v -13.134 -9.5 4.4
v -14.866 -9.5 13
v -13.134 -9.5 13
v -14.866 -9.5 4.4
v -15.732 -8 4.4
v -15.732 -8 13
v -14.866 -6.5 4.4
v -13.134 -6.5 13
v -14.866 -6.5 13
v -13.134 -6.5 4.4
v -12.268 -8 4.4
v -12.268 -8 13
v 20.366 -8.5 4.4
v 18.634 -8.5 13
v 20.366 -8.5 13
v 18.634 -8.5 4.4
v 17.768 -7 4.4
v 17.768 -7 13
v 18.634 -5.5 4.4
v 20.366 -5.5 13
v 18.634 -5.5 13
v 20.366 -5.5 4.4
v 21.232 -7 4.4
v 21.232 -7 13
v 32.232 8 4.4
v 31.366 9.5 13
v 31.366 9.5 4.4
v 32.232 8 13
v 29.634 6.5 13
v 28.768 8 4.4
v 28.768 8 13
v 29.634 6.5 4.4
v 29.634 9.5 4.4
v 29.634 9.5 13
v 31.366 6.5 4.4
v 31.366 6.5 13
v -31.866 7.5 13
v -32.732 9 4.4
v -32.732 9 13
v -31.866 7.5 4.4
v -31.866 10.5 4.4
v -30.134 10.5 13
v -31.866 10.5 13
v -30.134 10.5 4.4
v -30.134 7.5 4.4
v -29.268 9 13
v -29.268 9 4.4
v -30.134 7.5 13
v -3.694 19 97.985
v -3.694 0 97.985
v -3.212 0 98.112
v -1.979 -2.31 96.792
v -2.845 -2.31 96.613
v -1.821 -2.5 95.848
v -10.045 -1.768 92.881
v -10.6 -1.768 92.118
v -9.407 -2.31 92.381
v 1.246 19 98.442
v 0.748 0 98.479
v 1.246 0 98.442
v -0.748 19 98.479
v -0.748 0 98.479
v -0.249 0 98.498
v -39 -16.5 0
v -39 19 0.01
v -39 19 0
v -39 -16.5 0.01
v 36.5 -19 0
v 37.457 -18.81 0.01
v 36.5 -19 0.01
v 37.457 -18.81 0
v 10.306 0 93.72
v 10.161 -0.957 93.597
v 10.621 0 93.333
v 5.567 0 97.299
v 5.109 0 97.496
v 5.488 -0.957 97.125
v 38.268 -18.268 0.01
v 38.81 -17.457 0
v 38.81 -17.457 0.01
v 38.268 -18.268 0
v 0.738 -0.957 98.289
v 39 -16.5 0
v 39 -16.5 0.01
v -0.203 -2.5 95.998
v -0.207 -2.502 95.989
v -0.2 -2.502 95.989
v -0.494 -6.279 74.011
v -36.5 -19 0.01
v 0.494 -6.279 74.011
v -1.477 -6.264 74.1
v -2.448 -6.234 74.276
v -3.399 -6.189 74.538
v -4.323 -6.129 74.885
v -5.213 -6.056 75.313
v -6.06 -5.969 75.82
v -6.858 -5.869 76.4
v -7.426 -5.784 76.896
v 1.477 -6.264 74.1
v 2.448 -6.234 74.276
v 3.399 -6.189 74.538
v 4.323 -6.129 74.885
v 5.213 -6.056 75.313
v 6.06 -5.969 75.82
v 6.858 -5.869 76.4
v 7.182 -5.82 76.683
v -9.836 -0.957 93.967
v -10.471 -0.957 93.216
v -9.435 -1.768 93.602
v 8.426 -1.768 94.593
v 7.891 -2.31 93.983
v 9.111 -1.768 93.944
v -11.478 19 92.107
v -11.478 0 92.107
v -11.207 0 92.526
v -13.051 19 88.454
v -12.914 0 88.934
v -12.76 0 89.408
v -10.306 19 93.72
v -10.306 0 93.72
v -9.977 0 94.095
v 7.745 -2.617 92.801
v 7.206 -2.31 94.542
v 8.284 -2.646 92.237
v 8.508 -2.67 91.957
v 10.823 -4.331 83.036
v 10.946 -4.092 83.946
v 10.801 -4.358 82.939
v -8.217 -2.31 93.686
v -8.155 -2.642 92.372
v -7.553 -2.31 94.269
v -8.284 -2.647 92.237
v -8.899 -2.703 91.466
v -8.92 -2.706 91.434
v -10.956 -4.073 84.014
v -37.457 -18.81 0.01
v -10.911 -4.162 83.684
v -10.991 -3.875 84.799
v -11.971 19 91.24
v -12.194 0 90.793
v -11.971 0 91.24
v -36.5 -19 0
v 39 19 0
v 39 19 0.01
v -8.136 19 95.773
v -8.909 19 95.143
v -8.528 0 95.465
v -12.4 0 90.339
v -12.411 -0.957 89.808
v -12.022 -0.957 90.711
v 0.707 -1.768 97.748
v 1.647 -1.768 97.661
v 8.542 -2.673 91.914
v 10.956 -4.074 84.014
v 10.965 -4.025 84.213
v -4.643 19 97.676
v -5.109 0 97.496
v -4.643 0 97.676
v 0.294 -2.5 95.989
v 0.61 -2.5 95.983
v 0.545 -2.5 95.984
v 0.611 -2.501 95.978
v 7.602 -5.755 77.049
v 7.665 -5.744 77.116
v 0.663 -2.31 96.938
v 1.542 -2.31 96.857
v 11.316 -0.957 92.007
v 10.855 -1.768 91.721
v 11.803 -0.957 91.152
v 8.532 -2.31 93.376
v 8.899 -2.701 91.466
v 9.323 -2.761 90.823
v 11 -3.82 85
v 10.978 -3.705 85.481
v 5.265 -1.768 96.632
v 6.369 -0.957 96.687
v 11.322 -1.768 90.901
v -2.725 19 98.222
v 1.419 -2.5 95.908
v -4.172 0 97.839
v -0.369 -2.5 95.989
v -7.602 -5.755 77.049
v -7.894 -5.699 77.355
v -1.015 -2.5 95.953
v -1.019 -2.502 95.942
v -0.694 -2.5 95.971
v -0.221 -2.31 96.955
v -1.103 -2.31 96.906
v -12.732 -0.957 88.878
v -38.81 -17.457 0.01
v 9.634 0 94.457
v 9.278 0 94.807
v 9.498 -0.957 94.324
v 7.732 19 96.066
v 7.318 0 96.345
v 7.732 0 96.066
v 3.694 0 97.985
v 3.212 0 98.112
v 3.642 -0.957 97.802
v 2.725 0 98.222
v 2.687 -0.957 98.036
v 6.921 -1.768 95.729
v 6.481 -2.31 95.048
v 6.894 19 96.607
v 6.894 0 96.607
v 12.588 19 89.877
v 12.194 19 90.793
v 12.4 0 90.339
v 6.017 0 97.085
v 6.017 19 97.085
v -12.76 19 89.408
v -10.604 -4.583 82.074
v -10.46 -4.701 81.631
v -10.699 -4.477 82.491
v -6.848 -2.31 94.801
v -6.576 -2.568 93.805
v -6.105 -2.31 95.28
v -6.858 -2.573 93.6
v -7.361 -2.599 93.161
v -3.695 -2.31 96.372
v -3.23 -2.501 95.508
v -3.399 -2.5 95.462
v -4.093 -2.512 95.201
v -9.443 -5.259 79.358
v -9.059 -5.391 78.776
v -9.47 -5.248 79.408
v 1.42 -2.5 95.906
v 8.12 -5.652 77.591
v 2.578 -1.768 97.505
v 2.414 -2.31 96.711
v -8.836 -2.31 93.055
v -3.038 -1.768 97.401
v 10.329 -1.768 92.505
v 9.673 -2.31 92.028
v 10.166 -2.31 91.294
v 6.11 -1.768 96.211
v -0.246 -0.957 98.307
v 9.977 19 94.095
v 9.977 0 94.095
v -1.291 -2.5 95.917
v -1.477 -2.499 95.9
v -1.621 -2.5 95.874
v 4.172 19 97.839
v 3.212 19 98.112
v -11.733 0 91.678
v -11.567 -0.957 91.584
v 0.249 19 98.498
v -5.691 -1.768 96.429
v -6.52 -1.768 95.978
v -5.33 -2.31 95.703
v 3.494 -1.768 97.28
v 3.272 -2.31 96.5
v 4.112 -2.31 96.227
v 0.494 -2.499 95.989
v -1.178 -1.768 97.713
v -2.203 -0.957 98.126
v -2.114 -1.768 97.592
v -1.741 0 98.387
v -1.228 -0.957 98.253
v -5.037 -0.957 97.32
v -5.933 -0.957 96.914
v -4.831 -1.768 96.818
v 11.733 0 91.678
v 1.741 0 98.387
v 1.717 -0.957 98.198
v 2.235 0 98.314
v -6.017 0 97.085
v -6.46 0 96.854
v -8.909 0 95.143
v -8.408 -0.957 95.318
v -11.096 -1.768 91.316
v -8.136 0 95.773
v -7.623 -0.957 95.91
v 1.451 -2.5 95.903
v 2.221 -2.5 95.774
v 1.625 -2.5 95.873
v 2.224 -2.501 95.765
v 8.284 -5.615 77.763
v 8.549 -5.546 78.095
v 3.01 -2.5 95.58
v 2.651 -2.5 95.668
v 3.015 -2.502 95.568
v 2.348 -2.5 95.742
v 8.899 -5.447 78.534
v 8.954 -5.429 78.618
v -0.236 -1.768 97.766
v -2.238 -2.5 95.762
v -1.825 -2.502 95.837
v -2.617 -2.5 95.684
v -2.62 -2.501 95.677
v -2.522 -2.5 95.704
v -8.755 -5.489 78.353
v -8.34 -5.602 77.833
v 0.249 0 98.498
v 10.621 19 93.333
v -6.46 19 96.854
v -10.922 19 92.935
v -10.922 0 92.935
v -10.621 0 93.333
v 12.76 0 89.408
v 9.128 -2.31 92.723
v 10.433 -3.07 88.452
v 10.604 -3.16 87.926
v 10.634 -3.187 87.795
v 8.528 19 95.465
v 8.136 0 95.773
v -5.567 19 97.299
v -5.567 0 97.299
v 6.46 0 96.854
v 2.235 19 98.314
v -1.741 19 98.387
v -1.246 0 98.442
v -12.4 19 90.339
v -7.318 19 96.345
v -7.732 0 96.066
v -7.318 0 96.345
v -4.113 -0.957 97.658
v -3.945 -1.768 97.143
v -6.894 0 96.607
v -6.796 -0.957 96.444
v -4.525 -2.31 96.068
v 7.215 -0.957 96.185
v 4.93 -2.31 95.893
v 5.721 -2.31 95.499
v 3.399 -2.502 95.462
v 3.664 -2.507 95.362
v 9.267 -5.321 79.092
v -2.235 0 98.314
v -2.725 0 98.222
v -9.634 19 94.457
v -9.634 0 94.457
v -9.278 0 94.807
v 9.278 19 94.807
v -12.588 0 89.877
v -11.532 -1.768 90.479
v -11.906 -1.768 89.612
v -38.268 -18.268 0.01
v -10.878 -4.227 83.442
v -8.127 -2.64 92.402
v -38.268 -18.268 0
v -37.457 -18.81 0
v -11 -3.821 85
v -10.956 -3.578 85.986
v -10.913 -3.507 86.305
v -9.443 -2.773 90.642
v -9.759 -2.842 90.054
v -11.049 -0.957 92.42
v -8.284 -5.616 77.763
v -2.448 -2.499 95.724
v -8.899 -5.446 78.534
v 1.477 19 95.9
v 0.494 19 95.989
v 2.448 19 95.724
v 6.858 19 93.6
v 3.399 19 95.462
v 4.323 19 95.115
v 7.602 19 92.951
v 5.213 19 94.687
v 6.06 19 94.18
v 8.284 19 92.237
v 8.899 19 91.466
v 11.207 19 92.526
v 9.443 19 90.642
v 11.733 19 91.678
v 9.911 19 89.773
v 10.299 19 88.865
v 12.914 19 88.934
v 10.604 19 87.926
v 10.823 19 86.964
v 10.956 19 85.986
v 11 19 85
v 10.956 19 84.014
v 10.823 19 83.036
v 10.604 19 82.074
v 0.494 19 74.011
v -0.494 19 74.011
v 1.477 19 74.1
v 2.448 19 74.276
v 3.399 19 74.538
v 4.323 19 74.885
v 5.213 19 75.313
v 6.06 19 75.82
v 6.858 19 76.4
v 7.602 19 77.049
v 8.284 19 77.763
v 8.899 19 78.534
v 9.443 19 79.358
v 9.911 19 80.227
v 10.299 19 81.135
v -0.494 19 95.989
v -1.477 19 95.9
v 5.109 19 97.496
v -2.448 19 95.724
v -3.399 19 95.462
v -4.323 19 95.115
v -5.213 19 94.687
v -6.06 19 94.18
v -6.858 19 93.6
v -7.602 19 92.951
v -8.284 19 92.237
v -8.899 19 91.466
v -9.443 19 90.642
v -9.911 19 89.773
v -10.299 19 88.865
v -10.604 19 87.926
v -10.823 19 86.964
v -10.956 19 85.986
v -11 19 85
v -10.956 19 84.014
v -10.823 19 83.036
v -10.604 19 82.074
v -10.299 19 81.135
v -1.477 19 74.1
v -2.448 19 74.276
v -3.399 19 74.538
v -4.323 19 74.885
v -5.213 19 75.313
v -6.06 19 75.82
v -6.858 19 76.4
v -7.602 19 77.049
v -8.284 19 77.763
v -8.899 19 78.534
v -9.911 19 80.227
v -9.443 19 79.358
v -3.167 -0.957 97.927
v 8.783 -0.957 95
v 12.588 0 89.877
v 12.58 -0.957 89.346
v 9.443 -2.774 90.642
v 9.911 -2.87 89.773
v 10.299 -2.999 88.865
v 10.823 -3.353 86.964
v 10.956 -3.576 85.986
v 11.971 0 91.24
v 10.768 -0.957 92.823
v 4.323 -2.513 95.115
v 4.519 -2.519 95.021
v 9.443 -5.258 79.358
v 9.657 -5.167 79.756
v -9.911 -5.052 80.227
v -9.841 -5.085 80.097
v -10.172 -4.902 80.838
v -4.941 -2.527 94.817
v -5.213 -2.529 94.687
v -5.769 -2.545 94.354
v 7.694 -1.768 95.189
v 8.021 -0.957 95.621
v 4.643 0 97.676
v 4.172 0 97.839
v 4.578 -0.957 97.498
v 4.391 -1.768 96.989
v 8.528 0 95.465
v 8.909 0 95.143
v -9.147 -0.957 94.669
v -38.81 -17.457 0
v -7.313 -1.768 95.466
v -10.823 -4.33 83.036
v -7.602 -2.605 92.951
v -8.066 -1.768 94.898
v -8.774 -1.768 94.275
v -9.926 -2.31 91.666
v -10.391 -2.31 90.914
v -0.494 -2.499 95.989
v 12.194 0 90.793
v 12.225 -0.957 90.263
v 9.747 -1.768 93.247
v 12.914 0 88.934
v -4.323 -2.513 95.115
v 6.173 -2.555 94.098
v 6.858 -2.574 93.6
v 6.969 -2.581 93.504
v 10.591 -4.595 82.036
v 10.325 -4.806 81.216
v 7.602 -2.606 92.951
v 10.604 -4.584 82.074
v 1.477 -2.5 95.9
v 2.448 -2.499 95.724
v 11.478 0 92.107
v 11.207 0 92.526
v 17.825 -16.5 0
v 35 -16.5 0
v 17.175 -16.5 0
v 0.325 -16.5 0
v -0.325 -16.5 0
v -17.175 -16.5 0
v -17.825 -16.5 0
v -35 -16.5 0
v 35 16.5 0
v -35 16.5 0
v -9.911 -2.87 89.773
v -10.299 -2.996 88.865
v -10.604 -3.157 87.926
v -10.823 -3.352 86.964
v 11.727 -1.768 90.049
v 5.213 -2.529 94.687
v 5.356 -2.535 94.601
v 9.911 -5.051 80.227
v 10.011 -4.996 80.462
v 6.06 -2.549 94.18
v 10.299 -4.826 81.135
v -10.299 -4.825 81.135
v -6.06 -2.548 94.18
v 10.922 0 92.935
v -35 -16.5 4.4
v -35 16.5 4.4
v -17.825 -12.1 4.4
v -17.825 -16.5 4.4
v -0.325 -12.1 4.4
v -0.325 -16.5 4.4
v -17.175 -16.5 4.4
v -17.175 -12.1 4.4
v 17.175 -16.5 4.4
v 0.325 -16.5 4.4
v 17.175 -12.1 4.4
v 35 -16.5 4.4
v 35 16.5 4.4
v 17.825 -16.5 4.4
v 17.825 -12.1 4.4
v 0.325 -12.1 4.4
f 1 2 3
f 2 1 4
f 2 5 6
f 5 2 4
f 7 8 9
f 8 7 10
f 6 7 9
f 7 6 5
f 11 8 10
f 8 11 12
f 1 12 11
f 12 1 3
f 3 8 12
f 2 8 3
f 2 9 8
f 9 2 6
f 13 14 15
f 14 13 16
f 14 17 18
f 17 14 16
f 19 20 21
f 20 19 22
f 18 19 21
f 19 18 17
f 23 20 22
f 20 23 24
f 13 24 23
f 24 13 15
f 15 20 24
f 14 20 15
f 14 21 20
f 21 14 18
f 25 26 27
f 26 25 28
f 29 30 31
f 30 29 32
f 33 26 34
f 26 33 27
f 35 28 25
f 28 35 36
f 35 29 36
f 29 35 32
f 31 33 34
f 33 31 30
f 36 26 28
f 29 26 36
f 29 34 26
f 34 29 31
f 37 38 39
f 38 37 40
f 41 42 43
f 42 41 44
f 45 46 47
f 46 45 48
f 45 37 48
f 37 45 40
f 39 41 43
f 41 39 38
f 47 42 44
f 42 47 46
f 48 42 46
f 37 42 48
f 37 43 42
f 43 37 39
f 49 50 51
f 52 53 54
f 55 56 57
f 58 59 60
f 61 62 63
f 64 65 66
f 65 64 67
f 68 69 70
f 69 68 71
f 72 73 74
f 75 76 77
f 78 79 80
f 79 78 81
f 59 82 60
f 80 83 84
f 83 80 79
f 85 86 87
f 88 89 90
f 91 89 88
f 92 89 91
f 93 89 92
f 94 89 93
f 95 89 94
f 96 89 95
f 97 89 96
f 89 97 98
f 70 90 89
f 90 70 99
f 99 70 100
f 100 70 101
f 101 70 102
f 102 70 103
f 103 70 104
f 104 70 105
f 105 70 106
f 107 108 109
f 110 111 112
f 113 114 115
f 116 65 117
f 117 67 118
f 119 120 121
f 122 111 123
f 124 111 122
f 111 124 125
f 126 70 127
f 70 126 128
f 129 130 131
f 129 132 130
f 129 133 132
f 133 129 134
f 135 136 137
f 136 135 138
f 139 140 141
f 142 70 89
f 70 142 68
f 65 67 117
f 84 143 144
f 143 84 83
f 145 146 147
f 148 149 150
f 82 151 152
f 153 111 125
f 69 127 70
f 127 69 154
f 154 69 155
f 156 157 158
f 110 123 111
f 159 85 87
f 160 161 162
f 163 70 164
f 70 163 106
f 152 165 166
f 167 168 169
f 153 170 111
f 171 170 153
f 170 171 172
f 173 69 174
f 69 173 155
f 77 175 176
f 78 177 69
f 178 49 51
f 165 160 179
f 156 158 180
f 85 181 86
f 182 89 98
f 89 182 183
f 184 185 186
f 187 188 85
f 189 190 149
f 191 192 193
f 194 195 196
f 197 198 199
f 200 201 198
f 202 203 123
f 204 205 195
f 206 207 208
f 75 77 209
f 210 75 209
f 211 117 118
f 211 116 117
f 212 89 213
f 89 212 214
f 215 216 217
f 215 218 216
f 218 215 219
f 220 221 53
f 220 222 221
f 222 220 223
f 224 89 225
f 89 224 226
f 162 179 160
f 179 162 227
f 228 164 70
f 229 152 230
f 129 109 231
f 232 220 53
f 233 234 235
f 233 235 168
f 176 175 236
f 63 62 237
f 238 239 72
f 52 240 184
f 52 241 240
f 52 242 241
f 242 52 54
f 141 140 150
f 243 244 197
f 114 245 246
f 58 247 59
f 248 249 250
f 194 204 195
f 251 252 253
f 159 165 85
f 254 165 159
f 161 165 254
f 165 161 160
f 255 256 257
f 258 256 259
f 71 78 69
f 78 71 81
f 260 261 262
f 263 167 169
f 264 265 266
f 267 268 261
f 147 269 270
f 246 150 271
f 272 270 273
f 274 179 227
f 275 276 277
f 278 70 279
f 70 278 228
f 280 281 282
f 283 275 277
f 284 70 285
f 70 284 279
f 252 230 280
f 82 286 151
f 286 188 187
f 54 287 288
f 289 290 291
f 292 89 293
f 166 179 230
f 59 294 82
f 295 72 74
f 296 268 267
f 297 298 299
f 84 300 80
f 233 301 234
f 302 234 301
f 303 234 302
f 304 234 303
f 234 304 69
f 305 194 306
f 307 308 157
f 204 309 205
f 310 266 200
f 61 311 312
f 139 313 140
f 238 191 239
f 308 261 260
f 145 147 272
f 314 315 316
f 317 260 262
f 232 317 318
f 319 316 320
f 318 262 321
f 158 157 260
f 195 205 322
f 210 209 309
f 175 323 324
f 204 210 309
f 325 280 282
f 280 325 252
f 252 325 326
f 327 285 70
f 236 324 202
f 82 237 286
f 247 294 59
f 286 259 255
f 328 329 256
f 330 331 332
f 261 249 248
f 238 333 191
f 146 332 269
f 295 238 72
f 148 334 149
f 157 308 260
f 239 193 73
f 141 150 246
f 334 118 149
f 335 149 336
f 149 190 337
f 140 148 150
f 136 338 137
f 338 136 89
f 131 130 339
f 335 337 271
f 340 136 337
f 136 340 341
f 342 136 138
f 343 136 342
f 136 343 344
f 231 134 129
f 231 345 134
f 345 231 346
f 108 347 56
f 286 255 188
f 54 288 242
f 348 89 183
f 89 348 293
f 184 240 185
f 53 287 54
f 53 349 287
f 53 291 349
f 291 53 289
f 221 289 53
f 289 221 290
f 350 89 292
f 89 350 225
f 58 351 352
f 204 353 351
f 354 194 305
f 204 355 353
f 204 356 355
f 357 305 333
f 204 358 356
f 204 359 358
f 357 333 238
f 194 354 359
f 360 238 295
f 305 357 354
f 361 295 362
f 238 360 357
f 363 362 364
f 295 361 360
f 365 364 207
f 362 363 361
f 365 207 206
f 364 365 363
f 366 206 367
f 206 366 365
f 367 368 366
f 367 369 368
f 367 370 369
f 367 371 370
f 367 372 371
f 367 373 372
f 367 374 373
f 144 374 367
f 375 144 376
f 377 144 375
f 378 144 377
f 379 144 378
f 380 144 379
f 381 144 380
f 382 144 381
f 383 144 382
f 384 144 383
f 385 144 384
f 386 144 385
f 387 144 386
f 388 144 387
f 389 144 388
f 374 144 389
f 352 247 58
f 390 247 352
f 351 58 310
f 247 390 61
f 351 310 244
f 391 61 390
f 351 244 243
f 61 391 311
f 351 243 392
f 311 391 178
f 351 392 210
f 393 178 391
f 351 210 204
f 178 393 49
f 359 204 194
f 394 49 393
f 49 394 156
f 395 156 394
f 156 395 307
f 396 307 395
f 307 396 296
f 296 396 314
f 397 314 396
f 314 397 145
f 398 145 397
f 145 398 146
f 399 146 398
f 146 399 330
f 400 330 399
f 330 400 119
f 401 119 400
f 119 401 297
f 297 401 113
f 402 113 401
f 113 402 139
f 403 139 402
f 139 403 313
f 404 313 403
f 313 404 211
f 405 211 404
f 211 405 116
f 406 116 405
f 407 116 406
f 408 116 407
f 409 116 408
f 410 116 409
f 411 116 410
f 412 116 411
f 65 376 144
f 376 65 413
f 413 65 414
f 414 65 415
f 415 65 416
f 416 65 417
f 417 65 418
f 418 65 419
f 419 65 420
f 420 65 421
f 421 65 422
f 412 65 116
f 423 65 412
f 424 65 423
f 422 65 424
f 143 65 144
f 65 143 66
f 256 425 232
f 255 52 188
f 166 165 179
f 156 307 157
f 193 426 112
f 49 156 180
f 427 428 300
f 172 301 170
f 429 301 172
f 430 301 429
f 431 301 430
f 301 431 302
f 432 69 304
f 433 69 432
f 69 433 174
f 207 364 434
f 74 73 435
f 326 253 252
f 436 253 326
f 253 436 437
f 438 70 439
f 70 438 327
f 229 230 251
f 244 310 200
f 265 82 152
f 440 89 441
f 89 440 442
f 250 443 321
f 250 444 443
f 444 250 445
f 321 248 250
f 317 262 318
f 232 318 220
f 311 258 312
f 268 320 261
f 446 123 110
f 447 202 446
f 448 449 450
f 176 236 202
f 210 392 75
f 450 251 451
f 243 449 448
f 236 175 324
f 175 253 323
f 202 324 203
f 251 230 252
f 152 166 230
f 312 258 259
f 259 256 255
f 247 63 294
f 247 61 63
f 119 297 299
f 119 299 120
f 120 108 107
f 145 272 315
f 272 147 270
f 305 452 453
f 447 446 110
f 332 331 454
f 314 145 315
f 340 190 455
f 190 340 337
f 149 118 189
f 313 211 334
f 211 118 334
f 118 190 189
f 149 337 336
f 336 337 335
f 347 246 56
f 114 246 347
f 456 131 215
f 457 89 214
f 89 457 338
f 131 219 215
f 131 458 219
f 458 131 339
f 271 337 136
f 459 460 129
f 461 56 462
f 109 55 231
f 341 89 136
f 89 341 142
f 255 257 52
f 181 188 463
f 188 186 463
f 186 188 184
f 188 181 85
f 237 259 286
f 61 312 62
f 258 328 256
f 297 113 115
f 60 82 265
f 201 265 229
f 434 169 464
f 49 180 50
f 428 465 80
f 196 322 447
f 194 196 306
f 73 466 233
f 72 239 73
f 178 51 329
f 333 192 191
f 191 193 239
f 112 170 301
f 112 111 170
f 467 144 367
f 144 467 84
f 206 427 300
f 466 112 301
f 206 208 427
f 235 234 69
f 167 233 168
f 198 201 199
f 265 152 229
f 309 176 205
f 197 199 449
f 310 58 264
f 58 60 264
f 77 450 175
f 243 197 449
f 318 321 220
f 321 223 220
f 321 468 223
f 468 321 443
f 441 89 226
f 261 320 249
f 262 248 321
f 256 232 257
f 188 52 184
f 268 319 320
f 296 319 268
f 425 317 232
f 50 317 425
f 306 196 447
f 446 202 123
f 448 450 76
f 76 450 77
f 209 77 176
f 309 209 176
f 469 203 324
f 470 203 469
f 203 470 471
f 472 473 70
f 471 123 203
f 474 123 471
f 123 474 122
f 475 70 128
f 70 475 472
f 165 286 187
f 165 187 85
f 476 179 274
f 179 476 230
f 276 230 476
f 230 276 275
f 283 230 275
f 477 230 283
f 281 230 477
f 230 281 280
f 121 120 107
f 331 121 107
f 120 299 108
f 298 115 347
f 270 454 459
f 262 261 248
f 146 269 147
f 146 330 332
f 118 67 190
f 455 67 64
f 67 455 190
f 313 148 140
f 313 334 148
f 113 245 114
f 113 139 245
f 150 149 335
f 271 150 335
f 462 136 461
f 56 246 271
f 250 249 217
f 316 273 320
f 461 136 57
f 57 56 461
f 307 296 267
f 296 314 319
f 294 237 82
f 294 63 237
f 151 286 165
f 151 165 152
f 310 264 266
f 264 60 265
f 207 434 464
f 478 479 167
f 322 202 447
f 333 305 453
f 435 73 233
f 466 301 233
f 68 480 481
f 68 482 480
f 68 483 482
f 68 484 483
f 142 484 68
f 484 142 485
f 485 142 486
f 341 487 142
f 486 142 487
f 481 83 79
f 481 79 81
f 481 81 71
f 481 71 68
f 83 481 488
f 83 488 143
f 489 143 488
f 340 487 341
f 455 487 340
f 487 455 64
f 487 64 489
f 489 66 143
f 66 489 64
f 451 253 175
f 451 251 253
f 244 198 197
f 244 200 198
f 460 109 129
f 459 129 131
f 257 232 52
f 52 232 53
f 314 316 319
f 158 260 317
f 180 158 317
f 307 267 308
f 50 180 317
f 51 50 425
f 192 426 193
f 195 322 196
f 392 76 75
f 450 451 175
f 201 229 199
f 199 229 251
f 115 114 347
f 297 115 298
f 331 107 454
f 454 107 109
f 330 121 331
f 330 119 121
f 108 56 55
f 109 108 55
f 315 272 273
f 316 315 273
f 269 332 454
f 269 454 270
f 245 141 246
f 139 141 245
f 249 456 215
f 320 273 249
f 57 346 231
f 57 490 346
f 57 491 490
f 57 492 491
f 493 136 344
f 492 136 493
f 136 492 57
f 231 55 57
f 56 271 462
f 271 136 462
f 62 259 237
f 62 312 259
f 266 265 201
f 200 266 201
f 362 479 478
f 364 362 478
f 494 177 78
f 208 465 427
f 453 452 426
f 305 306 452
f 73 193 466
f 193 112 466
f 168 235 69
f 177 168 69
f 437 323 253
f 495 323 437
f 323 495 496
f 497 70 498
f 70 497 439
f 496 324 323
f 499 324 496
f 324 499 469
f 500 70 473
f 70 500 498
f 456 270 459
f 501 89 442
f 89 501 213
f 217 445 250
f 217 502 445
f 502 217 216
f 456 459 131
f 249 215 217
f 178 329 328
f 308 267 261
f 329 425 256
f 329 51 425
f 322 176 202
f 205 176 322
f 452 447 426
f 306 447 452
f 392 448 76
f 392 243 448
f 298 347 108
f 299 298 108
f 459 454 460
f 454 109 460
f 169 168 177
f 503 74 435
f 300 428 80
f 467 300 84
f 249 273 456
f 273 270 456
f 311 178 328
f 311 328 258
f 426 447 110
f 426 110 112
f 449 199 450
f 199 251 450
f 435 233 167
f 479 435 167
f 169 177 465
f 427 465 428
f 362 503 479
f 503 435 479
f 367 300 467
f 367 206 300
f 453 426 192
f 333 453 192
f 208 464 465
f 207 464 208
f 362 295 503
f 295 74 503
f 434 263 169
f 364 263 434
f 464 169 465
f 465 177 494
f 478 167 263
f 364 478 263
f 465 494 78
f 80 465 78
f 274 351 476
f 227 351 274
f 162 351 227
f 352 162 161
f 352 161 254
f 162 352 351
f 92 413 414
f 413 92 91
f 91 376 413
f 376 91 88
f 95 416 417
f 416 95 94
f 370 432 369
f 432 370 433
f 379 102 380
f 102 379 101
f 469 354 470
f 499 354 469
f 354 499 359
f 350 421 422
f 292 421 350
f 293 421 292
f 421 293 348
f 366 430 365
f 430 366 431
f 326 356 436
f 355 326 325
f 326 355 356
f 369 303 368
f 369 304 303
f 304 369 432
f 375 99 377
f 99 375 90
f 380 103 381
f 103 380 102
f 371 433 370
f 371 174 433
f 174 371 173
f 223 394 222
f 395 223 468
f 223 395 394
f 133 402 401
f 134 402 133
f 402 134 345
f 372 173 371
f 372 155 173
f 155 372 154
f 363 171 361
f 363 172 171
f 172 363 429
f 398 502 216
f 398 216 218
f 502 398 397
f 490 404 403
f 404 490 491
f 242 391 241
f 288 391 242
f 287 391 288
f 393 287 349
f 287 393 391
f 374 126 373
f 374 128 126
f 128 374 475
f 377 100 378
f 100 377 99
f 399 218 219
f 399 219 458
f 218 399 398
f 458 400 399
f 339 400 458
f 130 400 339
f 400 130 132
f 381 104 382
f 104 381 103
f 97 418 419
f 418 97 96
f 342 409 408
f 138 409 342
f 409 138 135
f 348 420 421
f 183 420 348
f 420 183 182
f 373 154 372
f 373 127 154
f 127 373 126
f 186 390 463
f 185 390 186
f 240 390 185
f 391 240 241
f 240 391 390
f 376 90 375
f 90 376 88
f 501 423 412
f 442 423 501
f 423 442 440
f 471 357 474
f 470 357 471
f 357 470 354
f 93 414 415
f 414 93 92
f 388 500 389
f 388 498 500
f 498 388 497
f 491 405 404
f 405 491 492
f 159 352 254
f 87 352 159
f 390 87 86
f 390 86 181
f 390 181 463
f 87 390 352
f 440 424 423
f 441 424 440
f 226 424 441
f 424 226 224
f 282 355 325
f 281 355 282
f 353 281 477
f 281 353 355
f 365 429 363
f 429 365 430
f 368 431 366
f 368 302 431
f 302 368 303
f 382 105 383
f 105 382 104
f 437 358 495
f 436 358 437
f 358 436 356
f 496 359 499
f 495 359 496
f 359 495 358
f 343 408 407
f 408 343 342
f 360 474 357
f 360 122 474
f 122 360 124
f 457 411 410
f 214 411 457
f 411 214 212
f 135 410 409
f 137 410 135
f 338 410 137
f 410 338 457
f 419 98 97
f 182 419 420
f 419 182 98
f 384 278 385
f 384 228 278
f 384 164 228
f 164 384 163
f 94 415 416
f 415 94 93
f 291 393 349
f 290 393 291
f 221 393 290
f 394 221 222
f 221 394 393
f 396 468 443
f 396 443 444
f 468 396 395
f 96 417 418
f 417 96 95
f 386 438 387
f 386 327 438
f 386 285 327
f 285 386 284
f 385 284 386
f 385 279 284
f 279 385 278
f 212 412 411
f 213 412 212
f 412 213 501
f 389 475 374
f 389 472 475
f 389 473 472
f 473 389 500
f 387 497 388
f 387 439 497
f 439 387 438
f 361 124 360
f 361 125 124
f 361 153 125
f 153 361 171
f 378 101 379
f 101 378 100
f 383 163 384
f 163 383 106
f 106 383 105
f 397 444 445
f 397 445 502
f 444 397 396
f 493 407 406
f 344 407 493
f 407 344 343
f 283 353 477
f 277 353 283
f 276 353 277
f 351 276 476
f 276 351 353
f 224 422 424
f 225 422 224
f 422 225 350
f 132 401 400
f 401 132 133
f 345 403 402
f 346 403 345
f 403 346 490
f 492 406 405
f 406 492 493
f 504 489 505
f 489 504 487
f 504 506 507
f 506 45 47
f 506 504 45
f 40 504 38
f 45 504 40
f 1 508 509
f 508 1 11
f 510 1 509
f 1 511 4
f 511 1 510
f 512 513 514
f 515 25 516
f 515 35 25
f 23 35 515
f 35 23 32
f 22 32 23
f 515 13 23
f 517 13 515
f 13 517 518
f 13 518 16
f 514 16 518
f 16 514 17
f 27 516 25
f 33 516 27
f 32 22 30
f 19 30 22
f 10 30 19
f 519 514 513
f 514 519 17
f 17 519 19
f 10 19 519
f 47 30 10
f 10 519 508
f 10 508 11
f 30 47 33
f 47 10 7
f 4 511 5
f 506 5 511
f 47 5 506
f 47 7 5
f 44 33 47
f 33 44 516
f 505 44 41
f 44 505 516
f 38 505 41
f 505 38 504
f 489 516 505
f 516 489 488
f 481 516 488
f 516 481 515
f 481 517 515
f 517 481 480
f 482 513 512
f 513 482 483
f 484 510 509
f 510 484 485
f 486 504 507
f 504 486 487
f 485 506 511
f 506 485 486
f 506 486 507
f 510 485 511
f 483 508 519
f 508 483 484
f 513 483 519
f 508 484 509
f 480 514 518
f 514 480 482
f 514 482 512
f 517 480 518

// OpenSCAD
$fa = .01;
$fs = 1;

inch = 25.4;

rod_diameter = 22;
paper_towel_height = 11 * inch;
paper_towel_diameter = 150;
pyramid_compensation = 3;

magnet_1_dims = [62, 31];
magnet_1_holes = [[magnet_1_dims.x - 17, 7.5], [magnet_1_dims.x - 50.5, 8.5]];
magnet_2_dims = [68, 30];
magnet_2_holes = [[magnet_2_dims.x - 3.5, 7], [magnet_2_dims.x - 65, 6]];
magnet_margin = 1;

magnet_space = [
    max(magnet_1_dims.x, magnet_2_dims.x) + 2 * magnet_margin,
    max(magnet_1_dims.y, magnet_2_dims.y) + 2 * magnet_margin,
  ];

magnet_thickness = max(5, 6);
screw_d = 3 /cos(30);
screw_h = 13;
twt = 2.5;
shadow_line = 1.5;

module torus (major_r, minor_r){
  rotate_extrude() translate([major_r, 0, 0]) circle(minor_r);
}

module magnet_test() {
  difference() {
    linear_extrude(2) square(magnet_space + 2 * twt * [1, 1], center = true);
    // screw holes
    mirror([1,0,0]){
      translate(magnet_1_holes[0] - .5 * magnet_1_dims) cylinder(d = screw_d, h = screw_h);
      translate(magnet_1_holes[1] - .5 * magnet_1_dims) cylinder(d = screw_d, h = screw_h);
      rotate(180) translate(magnet_2_holes[0] - .5 * magnet_2_dims) cylinder(d = screw_d, h = screw_h);
      rotate(180) translate(magnet_2_holes[1] - .5 * magnet_2_dims) cylinder(d = screw_d, h = screw_h);
    }
    // rod test fit
    cylinder(h = magnet_space.y + 2 * twt + .2, d = rod_diameter, center = true);
  }
}


module main() {
  h = 85;
  difference() {
    hull() {
      linear_extrude(.01) offset(twt) square([magnet_space.x + pyramid_compensation, magnet_space.y], center = true);
      //unround print-bed side corners
      translate([0,magnet_space.y/4,0]) linear_extrude(.01) offset(delta=twt) square([magnet_space.x + pyramid_compensation, magnet_space.y/2], center = true);
      translate([0, 0, h])
        rotate([-90, 0, 0])
          cylinder(h = magnet_space.y/2 + twt, d = rod_diameter + 2 * twt);
      translate([0, 0, h])rotate([-90, 0, 0])torus(rod_diameter/2, twt);
    }
    //hole for rod
    translate([0, 0, h])
      rotate([90, 0, 0])
        cylinder(h = magnet_space.y + 2 * twt + .2, d = rod_diameter, center = true);
    //empty space for magnets - shadow line!!!
    translate([0,0,-.1]) linear_extrude(magnet_thickness-shadow_line) square(magnet_space, center = true);
    // screw holes
    mirror([1,0,0]){
      translate(magnet_1_holes[0] - .5 * magnet_1_dims) cylinder(d = screw_d, h = screw_h, $fn=6);
      translate(magnet_1_holes[1] - .5 * magnet_1_dims) cylinder(d = screw_d, h = screw_h, $fn=6);
      rotate(180) translate(magnet_2_holes[0] - .5 * magnet_2_dims) cylinder(d = screw_d, h = screw_h, $fn=6);
      rotate(180) translate(magnet_2_holes[1] - .5 * magnet_2_dims) cylinder(d = screw_d, h = screw_h, $fn=6);
    }
  }
  //breakaway supports
  for(dx=[-1,0,1]) translate([dx*magnet_space.x/4,0,0]) hull(){
    w=.65;
    translate([-w/2,-magnet_space.y/2-w,0]) cube(w);
    translate([-w/2,-magnet_space.y/2,magnet_thickness]) cube([.65,magnet_thickness,.1]);
  }

  translate([0, 0, h]) rotate([- 90, 0, 0])%cylinder(h = paper_towel_height, d = paper_towel_diameter);
}
main();
